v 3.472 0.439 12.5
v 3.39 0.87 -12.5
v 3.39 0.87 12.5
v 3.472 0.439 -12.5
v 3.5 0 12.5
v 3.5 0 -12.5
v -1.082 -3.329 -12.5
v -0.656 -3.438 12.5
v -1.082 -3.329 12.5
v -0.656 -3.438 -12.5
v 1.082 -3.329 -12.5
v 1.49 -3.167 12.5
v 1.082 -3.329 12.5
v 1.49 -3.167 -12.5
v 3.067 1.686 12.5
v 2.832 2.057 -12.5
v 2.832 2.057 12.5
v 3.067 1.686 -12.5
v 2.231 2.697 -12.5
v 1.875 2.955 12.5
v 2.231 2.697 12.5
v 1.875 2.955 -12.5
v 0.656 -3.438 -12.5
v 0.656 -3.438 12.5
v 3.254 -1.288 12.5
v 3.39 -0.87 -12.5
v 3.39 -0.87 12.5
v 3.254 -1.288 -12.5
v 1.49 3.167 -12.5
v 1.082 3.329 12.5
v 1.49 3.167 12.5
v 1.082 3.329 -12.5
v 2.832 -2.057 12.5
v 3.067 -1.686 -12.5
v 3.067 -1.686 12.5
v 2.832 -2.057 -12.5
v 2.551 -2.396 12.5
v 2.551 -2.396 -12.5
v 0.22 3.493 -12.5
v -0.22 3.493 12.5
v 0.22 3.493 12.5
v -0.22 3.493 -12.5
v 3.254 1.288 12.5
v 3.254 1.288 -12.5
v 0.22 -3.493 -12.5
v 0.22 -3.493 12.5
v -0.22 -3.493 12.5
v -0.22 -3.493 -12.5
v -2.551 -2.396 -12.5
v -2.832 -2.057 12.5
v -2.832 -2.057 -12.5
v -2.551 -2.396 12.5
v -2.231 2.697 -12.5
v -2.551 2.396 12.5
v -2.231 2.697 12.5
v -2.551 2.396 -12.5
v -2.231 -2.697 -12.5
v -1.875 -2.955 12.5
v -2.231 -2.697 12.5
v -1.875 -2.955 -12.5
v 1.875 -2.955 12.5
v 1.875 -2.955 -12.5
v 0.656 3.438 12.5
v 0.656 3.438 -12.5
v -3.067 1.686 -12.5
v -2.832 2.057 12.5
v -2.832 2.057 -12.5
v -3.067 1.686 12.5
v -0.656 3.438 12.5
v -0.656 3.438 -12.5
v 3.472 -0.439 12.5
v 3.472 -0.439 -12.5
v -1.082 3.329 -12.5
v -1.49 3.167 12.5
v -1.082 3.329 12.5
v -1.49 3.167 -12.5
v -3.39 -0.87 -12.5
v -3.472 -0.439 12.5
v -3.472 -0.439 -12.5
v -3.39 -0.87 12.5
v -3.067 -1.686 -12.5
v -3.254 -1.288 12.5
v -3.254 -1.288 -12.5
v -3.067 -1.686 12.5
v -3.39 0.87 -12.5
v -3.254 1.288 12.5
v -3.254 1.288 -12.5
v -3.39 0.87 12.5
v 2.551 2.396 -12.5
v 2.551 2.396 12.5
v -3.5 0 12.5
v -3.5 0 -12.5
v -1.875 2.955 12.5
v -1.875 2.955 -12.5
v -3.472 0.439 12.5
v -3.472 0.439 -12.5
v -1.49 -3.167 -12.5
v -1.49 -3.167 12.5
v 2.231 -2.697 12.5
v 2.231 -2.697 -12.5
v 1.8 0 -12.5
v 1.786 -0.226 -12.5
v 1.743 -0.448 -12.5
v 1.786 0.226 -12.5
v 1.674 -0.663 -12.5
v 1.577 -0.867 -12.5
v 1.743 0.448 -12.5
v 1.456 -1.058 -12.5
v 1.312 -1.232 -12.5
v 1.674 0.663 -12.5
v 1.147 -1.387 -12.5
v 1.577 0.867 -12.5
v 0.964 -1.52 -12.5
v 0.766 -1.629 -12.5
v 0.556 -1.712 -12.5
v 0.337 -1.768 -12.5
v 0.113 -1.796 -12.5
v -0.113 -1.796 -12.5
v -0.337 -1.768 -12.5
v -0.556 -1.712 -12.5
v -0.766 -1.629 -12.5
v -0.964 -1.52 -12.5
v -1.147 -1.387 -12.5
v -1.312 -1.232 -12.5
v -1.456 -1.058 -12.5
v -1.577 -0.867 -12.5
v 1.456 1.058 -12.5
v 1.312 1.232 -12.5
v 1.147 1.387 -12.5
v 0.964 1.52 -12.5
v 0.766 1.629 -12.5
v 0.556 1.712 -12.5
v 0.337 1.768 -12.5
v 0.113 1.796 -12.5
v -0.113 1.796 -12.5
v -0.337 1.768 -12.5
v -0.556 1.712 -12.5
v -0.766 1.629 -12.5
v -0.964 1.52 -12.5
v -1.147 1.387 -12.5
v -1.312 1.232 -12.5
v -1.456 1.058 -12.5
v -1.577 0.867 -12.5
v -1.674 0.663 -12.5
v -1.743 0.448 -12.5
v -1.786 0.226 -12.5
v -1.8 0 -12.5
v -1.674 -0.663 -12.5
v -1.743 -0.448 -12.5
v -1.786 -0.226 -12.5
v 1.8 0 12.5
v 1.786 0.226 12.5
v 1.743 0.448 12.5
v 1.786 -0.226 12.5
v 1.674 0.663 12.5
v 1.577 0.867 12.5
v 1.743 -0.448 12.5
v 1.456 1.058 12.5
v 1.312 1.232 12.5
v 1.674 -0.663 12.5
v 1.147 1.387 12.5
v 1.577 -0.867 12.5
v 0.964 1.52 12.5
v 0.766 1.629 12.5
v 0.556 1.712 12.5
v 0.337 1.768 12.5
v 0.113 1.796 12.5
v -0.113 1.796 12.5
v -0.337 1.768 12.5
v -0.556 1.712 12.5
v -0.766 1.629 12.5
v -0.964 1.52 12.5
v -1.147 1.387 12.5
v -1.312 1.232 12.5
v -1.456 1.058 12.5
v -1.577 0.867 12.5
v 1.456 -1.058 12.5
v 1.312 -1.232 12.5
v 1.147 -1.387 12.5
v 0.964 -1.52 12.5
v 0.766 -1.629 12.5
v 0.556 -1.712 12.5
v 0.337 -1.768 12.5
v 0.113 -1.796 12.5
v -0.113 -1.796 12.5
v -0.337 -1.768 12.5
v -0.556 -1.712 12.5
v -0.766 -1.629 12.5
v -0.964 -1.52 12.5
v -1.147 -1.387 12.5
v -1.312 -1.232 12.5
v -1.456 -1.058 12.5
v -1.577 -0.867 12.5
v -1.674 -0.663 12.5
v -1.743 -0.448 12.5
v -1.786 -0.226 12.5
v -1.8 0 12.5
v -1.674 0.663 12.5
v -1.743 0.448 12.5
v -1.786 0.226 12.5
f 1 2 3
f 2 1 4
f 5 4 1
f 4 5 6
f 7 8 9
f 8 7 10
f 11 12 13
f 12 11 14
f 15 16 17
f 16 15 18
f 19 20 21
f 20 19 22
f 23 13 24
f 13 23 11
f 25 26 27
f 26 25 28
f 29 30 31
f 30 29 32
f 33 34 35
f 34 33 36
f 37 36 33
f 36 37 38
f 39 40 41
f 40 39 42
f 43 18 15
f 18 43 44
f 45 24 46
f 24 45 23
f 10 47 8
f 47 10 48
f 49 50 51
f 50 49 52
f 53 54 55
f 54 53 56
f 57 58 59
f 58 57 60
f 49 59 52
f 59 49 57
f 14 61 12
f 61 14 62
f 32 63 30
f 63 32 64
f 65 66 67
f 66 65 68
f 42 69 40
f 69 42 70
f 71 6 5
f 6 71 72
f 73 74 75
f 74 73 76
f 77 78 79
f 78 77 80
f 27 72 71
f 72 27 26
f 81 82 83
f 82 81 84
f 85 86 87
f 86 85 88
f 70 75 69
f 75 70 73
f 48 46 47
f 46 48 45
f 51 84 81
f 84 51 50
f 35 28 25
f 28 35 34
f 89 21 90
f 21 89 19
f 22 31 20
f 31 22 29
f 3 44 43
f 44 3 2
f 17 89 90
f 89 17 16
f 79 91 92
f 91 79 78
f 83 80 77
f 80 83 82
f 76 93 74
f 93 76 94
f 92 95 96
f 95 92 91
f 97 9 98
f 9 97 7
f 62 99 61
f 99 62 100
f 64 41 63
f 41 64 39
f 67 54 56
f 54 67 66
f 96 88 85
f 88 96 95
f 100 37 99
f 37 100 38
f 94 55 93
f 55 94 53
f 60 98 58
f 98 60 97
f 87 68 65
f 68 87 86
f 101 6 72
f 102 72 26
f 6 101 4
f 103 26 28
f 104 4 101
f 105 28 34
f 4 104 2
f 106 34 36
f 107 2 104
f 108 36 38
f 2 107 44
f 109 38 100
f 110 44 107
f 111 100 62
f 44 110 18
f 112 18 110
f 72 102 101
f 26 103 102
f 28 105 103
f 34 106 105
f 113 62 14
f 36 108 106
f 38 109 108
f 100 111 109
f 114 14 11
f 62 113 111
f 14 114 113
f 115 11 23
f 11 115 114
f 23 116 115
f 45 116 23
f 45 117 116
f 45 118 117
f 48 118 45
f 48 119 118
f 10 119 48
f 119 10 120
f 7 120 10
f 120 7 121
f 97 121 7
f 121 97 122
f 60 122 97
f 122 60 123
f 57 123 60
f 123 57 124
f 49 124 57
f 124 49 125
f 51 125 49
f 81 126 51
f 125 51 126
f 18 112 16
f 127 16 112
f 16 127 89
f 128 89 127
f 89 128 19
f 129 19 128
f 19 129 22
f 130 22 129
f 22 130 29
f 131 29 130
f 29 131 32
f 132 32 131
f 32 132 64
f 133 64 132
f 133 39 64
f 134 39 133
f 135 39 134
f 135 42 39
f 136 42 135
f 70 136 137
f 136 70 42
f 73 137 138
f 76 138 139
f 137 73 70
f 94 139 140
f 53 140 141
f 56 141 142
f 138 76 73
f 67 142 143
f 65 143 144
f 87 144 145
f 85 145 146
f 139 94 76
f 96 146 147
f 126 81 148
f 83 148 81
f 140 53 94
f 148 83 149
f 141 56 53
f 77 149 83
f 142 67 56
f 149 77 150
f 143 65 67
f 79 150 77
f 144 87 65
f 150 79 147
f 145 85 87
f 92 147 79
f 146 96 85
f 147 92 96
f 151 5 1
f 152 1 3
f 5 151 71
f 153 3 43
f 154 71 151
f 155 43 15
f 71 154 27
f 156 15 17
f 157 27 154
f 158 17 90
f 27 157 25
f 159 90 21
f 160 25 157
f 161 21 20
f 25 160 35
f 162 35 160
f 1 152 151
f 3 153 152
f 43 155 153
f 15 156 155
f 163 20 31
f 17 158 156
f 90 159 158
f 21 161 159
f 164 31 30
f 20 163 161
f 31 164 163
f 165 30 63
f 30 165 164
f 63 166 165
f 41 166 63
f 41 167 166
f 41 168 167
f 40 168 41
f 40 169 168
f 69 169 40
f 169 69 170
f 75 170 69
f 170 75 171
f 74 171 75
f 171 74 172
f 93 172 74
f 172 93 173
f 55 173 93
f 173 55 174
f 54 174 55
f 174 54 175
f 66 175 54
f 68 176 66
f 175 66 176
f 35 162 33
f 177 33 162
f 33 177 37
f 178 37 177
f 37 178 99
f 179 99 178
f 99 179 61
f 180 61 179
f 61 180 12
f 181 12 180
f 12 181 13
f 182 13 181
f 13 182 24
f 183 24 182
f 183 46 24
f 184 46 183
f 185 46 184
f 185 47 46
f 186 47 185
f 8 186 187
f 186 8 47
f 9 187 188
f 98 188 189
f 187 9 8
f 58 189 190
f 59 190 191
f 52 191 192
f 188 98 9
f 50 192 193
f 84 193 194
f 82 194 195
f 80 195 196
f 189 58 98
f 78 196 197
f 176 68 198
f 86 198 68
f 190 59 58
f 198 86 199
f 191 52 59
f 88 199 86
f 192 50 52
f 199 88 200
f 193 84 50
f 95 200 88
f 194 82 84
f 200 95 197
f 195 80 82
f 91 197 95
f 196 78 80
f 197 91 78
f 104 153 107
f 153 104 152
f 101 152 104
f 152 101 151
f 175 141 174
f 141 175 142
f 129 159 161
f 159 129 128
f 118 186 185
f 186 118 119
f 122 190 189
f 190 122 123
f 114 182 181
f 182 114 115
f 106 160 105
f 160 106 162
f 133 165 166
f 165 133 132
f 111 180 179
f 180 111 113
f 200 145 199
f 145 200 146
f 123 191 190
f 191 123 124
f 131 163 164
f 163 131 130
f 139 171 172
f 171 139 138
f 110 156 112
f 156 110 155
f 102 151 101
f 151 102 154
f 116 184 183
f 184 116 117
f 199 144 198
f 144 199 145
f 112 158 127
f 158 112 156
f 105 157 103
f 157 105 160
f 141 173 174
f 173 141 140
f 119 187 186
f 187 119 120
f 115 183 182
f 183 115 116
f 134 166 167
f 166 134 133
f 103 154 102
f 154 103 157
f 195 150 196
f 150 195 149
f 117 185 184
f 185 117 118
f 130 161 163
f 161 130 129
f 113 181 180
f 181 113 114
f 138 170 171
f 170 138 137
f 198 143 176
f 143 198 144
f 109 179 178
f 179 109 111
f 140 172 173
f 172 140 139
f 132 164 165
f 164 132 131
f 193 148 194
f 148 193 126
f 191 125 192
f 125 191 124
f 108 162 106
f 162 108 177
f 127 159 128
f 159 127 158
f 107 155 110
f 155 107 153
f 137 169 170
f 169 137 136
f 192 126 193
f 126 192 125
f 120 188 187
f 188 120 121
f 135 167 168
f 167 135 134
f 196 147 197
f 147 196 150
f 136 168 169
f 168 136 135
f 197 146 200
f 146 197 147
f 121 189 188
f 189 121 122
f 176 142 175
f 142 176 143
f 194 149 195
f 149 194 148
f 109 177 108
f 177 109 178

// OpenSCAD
$fn = 50;


difference() {
	union() {
		translate(v = [0, 0, -12.5000000000]) {
			cylinder(h = 25, r = 3.5000000000);
		}
	}
	union() {
		#translate(v = [0, 0, -100.0000000000]) {
			cylinder(h = 200, r = 1.8000000000);
		}
	}
}
